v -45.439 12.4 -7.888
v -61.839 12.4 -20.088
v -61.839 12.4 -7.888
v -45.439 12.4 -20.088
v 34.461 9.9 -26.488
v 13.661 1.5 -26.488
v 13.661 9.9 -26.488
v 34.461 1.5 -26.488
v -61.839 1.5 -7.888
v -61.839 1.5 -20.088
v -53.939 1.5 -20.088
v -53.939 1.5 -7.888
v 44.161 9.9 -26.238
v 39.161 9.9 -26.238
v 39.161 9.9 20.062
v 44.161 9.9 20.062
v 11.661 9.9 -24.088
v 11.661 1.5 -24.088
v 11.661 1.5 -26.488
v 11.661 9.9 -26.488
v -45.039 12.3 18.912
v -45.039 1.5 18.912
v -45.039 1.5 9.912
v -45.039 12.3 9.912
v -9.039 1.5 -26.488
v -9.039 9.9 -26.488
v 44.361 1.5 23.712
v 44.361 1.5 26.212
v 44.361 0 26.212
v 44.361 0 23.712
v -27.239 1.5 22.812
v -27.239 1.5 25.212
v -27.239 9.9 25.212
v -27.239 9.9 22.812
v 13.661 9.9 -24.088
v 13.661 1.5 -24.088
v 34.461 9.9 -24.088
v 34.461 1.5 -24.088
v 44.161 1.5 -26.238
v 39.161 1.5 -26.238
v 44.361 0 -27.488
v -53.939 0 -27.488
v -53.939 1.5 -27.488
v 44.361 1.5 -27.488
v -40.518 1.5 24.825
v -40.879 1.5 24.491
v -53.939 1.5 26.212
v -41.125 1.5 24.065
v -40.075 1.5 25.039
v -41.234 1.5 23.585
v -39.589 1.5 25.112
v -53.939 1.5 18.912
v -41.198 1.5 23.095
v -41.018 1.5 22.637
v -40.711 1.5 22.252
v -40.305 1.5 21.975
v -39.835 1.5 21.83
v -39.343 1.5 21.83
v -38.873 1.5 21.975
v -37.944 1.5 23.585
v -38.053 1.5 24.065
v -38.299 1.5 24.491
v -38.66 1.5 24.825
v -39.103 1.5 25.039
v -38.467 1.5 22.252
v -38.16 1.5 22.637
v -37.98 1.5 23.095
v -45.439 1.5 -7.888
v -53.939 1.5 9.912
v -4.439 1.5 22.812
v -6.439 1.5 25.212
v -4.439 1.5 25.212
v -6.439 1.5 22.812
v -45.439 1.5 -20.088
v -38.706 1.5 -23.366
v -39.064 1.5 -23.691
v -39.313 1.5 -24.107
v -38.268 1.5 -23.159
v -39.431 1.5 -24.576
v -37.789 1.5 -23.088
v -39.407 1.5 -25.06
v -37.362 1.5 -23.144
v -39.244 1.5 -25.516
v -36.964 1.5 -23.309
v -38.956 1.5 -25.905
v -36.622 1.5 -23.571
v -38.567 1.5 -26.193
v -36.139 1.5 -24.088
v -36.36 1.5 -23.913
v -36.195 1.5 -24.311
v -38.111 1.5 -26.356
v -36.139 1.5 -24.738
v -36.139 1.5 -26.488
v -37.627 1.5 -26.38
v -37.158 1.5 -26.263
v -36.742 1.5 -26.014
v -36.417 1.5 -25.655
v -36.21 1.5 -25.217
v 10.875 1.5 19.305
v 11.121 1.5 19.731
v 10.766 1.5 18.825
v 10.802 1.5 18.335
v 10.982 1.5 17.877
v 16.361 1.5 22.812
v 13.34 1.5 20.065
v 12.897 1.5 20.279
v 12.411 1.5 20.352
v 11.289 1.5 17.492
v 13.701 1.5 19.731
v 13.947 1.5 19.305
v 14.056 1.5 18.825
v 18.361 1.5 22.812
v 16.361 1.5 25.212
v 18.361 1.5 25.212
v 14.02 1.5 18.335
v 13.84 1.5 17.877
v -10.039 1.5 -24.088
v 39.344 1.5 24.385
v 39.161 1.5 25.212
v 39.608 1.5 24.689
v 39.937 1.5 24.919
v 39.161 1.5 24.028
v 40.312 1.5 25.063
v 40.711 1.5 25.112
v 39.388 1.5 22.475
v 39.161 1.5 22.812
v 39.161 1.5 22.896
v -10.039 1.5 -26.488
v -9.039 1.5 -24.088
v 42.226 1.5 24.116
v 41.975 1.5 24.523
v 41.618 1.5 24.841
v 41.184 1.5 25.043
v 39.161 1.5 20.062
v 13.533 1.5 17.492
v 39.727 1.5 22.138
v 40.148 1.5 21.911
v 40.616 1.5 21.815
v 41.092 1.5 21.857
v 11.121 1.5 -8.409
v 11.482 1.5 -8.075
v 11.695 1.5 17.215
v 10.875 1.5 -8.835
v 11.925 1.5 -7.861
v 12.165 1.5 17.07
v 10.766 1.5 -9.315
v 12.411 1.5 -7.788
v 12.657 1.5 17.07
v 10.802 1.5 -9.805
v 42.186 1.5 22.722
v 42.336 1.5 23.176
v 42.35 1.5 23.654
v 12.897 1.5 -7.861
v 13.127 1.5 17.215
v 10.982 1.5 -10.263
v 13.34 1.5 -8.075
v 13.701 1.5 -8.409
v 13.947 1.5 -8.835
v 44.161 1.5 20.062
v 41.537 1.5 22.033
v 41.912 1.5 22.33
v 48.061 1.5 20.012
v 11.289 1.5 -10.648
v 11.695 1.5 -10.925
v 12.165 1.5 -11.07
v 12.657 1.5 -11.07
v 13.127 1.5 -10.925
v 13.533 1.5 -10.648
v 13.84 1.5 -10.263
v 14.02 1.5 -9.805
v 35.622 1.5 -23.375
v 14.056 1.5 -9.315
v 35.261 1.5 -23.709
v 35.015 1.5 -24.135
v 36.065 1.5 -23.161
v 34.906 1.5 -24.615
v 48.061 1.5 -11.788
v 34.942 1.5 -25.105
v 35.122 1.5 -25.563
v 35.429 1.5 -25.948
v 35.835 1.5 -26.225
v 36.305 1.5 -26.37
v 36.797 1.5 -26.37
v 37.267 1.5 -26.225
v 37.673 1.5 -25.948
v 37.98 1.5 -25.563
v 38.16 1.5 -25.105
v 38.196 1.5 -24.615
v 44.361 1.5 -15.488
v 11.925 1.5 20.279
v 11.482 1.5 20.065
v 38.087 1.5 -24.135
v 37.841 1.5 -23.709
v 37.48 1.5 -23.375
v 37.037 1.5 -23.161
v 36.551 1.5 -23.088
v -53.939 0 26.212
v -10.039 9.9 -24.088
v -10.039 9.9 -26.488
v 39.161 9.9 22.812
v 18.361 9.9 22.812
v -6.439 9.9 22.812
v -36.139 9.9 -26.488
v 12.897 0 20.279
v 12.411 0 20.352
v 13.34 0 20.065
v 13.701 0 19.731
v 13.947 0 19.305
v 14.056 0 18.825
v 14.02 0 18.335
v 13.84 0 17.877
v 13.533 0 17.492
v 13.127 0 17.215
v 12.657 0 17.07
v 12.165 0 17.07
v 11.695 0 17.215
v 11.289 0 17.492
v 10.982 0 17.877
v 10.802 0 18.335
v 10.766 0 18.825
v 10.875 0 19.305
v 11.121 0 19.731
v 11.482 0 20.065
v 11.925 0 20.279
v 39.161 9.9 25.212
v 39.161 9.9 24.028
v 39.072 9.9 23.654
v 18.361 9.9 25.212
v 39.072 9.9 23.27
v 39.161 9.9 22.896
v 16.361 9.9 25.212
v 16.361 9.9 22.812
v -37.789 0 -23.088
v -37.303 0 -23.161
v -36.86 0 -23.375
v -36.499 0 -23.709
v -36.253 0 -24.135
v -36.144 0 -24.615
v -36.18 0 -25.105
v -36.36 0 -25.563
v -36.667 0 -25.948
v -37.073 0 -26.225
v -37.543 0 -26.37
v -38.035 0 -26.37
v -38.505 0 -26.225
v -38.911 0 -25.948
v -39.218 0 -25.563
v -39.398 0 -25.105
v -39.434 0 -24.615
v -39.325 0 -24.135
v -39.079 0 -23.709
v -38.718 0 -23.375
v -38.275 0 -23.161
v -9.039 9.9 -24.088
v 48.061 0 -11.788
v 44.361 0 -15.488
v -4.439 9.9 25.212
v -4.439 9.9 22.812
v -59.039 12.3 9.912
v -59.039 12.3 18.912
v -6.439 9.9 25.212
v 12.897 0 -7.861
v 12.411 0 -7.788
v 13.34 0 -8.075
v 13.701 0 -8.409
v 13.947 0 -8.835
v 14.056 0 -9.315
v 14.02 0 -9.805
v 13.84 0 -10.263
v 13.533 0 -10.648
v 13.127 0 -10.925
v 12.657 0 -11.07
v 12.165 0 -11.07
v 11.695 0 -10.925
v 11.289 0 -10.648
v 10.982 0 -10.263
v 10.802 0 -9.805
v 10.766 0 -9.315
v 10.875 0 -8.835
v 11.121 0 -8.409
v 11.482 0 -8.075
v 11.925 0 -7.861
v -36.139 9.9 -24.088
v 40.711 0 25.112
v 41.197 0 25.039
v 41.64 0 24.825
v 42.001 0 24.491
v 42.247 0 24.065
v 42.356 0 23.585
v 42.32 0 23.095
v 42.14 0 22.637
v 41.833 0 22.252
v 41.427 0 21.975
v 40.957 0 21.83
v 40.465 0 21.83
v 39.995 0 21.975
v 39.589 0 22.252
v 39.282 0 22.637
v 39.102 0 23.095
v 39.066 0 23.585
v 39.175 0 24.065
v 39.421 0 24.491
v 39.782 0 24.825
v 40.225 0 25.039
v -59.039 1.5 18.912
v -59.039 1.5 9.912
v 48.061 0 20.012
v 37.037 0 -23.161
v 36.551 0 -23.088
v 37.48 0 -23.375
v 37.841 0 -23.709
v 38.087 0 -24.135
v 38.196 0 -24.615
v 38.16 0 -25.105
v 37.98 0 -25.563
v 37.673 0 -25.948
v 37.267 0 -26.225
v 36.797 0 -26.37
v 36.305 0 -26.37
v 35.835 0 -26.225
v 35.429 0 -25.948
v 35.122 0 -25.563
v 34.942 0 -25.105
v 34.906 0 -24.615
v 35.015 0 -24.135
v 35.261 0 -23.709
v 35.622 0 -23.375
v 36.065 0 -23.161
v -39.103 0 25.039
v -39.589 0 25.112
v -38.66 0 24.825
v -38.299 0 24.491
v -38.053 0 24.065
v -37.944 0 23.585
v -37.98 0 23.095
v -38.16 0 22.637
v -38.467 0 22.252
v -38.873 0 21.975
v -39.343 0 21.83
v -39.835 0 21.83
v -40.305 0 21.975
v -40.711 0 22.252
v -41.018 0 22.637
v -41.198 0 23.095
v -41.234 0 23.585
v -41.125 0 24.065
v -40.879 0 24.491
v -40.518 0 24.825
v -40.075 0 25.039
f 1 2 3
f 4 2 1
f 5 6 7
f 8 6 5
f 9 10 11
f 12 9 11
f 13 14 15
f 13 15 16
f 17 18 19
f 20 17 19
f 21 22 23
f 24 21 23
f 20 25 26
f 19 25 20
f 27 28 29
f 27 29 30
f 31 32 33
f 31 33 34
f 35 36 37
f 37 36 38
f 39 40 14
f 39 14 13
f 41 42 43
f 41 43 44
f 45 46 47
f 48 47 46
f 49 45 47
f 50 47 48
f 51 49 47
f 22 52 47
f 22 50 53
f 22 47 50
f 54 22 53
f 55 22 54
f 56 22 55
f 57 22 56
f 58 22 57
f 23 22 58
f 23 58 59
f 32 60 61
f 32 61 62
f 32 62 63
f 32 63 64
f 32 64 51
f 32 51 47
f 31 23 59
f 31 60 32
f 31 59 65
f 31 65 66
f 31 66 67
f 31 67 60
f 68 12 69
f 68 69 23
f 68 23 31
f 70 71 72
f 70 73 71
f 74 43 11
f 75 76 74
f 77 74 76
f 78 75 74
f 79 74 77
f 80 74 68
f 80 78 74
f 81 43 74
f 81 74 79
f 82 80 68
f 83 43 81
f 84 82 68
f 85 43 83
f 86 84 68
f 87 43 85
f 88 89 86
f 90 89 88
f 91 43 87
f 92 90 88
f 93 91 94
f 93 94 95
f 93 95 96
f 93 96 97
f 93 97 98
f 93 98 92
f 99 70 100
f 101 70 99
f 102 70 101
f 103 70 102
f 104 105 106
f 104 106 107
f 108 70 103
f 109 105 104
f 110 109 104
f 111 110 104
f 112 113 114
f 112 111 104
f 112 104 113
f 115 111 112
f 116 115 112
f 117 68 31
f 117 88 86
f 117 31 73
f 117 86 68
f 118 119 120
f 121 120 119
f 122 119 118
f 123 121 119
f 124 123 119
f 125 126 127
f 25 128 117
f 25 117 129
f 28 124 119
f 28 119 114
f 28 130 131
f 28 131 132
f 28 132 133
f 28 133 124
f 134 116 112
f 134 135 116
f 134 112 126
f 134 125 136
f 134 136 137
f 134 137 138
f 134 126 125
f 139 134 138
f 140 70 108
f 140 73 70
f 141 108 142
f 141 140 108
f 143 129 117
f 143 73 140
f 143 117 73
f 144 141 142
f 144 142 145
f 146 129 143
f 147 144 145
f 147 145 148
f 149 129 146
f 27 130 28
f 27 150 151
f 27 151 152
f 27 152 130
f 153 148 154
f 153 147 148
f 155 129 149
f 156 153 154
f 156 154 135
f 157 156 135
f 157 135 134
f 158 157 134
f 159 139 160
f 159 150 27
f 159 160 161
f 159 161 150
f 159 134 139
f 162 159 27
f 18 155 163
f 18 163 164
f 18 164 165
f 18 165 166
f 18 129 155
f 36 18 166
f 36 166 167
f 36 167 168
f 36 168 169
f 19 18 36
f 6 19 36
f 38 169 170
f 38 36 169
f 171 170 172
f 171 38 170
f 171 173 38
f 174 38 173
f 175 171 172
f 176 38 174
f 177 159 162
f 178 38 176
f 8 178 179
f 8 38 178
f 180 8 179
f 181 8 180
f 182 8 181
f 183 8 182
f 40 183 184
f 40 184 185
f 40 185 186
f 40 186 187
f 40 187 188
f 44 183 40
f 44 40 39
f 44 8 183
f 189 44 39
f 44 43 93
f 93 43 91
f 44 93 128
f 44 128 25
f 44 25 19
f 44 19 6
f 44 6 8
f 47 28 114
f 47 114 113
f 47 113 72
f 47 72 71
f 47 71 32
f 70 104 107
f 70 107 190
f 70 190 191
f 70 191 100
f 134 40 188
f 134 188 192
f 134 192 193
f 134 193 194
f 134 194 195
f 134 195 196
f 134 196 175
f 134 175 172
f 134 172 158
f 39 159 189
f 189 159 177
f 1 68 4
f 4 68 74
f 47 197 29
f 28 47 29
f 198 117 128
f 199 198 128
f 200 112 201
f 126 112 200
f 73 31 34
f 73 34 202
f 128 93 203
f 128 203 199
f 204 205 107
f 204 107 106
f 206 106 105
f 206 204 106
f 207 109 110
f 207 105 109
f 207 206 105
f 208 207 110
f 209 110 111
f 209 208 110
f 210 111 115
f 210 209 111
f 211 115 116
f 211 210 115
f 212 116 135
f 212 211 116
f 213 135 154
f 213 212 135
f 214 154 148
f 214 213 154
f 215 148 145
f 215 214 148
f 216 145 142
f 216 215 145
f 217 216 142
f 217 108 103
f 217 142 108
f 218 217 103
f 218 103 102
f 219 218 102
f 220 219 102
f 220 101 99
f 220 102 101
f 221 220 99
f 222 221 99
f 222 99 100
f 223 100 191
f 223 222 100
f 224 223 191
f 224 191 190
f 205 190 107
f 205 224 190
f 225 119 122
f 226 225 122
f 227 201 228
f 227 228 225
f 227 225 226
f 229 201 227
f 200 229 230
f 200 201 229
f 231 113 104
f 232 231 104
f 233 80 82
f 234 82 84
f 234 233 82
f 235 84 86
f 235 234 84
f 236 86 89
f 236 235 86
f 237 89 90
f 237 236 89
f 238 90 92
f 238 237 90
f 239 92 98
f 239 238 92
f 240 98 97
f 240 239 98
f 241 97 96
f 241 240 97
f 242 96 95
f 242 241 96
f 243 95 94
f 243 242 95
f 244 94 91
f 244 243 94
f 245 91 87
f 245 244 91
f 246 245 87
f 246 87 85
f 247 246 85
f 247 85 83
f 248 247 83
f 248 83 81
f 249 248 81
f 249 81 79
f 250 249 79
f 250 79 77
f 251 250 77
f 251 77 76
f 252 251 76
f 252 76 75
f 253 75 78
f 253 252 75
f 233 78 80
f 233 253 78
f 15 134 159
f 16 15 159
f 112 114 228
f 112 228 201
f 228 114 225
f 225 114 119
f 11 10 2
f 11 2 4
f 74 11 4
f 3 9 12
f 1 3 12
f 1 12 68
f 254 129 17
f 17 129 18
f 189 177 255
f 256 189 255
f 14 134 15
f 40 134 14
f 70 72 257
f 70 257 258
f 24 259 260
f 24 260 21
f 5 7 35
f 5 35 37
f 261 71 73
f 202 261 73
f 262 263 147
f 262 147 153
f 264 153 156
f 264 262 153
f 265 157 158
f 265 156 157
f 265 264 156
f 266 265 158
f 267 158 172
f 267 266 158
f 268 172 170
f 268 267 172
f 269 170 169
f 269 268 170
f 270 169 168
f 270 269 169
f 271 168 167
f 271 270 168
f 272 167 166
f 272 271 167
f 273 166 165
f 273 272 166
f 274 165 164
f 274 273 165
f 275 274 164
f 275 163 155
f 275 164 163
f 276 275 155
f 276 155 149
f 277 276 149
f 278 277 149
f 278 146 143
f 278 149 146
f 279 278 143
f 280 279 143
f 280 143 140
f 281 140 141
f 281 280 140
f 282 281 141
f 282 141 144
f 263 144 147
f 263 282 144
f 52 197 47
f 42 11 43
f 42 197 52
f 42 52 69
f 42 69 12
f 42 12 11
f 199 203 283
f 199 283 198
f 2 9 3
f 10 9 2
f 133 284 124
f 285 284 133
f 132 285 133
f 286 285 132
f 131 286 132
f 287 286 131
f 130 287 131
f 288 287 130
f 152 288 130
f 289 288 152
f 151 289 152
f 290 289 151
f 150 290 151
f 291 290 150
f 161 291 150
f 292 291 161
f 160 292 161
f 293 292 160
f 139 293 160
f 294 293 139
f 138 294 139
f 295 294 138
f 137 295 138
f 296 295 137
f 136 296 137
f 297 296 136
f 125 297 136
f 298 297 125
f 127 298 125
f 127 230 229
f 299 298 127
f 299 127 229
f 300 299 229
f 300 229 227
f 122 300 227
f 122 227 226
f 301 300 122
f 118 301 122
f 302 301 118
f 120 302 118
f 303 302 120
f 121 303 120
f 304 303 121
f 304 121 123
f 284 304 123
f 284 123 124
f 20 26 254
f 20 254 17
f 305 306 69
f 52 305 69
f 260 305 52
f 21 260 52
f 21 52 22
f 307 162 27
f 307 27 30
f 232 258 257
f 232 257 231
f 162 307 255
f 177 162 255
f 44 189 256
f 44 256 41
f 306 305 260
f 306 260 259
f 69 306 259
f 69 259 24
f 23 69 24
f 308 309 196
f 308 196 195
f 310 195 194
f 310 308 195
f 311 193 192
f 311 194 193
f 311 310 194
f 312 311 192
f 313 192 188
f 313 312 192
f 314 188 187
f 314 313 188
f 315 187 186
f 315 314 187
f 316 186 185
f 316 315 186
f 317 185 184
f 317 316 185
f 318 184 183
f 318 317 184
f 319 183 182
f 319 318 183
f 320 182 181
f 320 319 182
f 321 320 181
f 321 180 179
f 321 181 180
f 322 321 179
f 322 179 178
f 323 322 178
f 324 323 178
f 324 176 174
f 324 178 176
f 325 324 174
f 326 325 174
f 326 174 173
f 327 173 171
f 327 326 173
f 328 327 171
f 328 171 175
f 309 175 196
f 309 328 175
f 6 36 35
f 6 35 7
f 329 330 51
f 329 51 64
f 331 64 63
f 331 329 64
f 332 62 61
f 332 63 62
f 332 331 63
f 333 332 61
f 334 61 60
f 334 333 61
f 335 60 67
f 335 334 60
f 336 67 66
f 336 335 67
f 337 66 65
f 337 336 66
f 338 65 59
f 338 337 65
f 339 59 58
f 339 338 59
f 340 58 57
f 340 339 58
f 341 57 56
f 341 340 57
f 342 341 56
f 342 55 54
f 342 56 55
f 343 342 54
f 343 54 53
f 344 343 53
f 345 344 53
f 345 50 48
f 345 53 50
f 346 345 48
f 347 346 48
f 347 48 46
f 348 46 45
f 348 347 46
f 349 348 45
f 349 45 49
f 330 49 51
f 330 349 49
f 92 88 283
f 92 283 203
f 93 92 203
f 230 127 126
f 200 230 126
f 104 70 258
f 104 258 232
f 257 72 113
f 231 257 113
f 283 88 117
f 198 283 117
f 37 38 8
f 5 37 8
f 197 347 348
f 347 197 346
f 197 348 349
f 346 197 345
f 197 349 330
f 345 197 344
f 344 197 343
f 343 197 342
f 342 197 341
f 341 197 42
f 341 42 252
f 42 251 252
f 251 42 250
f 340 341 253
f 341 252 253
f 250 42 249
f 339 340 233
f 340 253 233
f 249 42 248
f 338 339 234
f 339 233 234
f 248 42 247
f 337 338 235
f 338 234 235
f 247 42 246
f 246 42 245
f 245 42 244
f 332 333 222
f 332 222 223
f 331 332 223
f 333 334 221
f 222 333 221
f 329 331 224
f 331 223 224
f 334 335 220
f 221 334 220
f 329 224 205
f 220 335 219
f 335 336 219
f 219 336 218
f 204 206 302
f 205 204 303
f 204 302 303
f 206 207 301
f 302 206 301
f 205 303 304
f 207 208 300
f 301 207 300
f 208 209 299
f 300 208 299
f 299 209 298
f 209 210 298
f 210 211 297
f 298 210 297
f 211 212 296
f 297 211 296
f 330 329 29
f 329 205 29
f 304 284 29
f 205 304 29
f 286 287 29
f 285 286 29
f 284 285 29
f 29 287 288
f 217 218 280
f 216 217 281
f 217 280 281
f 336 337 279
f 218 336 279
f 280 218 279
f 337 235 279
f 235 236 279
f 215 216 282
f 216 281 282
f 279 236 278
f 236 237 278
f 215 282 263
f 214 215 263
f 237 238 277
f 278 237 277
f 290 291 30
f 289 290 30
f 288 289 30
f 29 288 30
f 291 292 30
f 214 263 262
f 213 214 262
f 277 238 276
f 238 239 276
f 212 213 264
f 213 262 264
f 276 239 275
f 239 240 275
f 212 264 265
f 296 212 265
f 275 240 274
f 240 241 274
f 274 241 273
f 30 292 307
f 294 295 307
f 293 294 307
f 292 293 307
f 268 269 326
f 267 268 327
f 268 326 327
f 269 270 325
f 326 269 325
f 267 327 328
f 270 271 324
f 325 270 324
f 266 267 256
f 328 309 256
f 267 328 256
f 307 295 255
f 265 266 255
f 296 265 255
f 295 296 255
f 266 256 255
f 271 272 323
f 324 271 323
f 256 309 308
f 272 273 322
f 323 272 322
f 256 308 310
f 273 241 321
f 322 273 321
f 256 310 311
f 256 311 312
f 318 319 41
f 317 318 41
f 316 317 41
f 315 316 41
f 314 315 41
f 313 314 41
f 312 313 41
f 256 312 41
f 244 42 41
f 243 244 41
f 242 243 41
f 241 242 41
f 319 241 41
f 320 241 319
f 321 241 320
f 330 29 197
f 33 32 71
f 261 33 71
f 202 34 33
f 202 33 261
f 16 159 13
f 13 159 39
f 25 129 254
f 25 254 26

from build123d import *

# Parameters (mm, degrees)
SKETCH_2_W               = 102
SKETCH_2_H               = 53.7
EXTRUDE_1_DEPTH          = 1.5
SKETCH_3_W               = 16.4
SKETCH_3_H               = 12.2
EXTRUDE_2_DEPTH          = 10.9
SKETCH_5_W               = 14
SKETCH_5_H               = 9
EXTRUDE_3_DEPTH          = 10.8
SKETCH_6_W               = 20.8
SKETCH_6_H               = 2.4
SKETCH_6_W_2             = 26.1
SKETCH_6_W_3             = 20.7
SKETCH_6_W_4             = 5
SKETCH_6_H_2             = 46.3
EXTRUDE_6_DEPTH          = 8.4
SKETCH_9_W               = 3.7
SKETCH_9_H               = 12
SKETCH_9_H_2             = 2.5
CUT_EXTRUDE_1_DEPTH      = 69.545367627
CHAMFER_1_SIZE           = 3.7
CUT_EXTRUDE_2_DEPTH      = 69.545367627
CUT_EXTRUDE_2_DEPTH_BACK = 69.545367627
SKETCH_7_R               = 1.65


with BuildPart() as part:
    # Эскиз2 → Бобышка-Вытянуть1 (new body)
    with BuildSketch(Plane(origin=(0, 0, 0), x_dir=(1, 0, 0), z_dir=(0, 1, 0))):
        with Locations((-2.938983051, 0.638135593)):
            Rectangle(SKETCH_2_W, SKETCH_2_H)
    extrude(amount=EXTRUDE_1_DEPTH)

    # Эскиз3 → Бобышка-Вытянуть2 (add)
    with BuildSketch(Plane(origin=(0, 1.5, 0), x_dir=(1, 0, 0), z_dir=(0, 1, 0))):
        with Locations((-53.638983051, 13.988135593)):
            Rectangle(SKETCH_3_W, SKETCH_3_H)
    extrude(amount=EXTRUDE_2_DEPTH)

    # Эскиз5 → Бобышка-Вытянуть3 (add)
    with BuildSketch(Plane(origin=(0, 1.5, 0), x_dir=(1, 0, 0), z_dir=(0, 1, 0))):
        with Locations((-52.038983051, -14.411864407)):
            Rectangle(SKETCH_5_W, SKETCH_5_H)
    extrude(amount=EXTRUDE_3_DEPTH)

    # Эскиз6 → Бобышка-Вытянуть6 (add)
    with BuildSketch(Plane(origin=(0, 1.5, 0), x_dir=(1, 0, 0), z_dir=(0, 1, 0))):
        with Locations((-16.838983051, -24.011864407)):
            Rectangle(SKETCH_6_W, SKETCH_6_H)
        with Locations((5.961016949, -24.011864407)):
            Rectangle(SKETCH_6_W, SKETCH_6_H)
        with Locations((28.761016949, -24.011864407)):
            Rectangle(SKETCH_6_W, SKETCH_6_H)
        with Locations((-23.088983051, 25.288135593)):
            Rectangle(SKETCH_6_W_2, SKETCH_6_H)
        with Locations((1.311016949, 25.288135593)):
            Rectangle(SKETCH_6_W_3, SKETCH_6_H)
        with Locations((24.061016949, 25.288135593)):
            Rectangle(SKETCH_6_W, SKETCH_6_H)
        with Locations((41.661016949, 3.088135593)):
            Rectangle(SKETCH_6_W_4, SKETCH_6_H_2)
    extrude(amount=EXTRUDE_6_DEPTH)

    # Эскиз9 → Вырез-Вытянуть1 (cut, through all)
    with BuildSketch(Plane(origin=(0, 1.5, 0), x_dir=(1, 0, 0), z_dir=(0, 1, 0))):
        with Locations((46.211016949, 21.488135593)):
            Rectangle(SKETCH_9_W, SKETCH_9_H)
        with Locations((46.211016949, -24.961864407)):
            Rectangle(SKETCH_9_W, SKETCH_9_H_2)
    extrude(amount=-CUT_EXTRUDE_1_DEPTH, mode=Mode.SUBTRACT)

    # Фаска1
    chamfer_1_edges = [part.edges().sort_by_distance(p)[0] for p in [
        (48.061016949, 0.75, 23.711864407),
        (48.061016949, 0.75, -15.488135593),
    ]]
    chamfer(chamfer_1_edges, length=CHAMFER_1_SIZE - 0.0001)  # a hair under: the kernel refuses the full size

    # Эскиз7 → Вырез-Вытянуть2 (cut, two sides: drawn at the far end of the back side and taken through both)
    with BuildSketch(Plane(origin=(0, 1.5, 0), x_dir=(1, 0, 0), z_dir=(0, 1, 0)).offset(-CUT_EXTRUDE_2_DEPTH_BACK)):
        with Locations(Location((-37.788983051, 24.738135593, 0), (0, 0, 270))):
            Circle(SKETCH_7_R)
        with Locations(Location((-39.588983051, -23.461864407, 0), (0, 0, 270))):
            Circle(SKETCH_7_R)
        with Locations(Location((12.411016949, 9.438135593, 0), (0, 0, 270))):
            Circle(SKETCH_7_R)
        with Locations(Location((12.411016949, -18.701864407, 0), (0, 0, 270))):
            Circle(SKETCH_7_R)
        with Locations(Location((36.551016949, 24.738135593, 0), (0, 0, 270))):
            Circle(SKETCH_7_R)
        with Locations(Location((40.711016949, -23.461864407, 0), (0, 0, 270))):
            Circle(SKETCH_7_R)
    extrude(amount=CUT_EXTRUDE_2_DEPTH + CUT_EXTRUDE_2_DEPTH_BACK, mode=Mode.SUBTRACT)


solid = part.part
